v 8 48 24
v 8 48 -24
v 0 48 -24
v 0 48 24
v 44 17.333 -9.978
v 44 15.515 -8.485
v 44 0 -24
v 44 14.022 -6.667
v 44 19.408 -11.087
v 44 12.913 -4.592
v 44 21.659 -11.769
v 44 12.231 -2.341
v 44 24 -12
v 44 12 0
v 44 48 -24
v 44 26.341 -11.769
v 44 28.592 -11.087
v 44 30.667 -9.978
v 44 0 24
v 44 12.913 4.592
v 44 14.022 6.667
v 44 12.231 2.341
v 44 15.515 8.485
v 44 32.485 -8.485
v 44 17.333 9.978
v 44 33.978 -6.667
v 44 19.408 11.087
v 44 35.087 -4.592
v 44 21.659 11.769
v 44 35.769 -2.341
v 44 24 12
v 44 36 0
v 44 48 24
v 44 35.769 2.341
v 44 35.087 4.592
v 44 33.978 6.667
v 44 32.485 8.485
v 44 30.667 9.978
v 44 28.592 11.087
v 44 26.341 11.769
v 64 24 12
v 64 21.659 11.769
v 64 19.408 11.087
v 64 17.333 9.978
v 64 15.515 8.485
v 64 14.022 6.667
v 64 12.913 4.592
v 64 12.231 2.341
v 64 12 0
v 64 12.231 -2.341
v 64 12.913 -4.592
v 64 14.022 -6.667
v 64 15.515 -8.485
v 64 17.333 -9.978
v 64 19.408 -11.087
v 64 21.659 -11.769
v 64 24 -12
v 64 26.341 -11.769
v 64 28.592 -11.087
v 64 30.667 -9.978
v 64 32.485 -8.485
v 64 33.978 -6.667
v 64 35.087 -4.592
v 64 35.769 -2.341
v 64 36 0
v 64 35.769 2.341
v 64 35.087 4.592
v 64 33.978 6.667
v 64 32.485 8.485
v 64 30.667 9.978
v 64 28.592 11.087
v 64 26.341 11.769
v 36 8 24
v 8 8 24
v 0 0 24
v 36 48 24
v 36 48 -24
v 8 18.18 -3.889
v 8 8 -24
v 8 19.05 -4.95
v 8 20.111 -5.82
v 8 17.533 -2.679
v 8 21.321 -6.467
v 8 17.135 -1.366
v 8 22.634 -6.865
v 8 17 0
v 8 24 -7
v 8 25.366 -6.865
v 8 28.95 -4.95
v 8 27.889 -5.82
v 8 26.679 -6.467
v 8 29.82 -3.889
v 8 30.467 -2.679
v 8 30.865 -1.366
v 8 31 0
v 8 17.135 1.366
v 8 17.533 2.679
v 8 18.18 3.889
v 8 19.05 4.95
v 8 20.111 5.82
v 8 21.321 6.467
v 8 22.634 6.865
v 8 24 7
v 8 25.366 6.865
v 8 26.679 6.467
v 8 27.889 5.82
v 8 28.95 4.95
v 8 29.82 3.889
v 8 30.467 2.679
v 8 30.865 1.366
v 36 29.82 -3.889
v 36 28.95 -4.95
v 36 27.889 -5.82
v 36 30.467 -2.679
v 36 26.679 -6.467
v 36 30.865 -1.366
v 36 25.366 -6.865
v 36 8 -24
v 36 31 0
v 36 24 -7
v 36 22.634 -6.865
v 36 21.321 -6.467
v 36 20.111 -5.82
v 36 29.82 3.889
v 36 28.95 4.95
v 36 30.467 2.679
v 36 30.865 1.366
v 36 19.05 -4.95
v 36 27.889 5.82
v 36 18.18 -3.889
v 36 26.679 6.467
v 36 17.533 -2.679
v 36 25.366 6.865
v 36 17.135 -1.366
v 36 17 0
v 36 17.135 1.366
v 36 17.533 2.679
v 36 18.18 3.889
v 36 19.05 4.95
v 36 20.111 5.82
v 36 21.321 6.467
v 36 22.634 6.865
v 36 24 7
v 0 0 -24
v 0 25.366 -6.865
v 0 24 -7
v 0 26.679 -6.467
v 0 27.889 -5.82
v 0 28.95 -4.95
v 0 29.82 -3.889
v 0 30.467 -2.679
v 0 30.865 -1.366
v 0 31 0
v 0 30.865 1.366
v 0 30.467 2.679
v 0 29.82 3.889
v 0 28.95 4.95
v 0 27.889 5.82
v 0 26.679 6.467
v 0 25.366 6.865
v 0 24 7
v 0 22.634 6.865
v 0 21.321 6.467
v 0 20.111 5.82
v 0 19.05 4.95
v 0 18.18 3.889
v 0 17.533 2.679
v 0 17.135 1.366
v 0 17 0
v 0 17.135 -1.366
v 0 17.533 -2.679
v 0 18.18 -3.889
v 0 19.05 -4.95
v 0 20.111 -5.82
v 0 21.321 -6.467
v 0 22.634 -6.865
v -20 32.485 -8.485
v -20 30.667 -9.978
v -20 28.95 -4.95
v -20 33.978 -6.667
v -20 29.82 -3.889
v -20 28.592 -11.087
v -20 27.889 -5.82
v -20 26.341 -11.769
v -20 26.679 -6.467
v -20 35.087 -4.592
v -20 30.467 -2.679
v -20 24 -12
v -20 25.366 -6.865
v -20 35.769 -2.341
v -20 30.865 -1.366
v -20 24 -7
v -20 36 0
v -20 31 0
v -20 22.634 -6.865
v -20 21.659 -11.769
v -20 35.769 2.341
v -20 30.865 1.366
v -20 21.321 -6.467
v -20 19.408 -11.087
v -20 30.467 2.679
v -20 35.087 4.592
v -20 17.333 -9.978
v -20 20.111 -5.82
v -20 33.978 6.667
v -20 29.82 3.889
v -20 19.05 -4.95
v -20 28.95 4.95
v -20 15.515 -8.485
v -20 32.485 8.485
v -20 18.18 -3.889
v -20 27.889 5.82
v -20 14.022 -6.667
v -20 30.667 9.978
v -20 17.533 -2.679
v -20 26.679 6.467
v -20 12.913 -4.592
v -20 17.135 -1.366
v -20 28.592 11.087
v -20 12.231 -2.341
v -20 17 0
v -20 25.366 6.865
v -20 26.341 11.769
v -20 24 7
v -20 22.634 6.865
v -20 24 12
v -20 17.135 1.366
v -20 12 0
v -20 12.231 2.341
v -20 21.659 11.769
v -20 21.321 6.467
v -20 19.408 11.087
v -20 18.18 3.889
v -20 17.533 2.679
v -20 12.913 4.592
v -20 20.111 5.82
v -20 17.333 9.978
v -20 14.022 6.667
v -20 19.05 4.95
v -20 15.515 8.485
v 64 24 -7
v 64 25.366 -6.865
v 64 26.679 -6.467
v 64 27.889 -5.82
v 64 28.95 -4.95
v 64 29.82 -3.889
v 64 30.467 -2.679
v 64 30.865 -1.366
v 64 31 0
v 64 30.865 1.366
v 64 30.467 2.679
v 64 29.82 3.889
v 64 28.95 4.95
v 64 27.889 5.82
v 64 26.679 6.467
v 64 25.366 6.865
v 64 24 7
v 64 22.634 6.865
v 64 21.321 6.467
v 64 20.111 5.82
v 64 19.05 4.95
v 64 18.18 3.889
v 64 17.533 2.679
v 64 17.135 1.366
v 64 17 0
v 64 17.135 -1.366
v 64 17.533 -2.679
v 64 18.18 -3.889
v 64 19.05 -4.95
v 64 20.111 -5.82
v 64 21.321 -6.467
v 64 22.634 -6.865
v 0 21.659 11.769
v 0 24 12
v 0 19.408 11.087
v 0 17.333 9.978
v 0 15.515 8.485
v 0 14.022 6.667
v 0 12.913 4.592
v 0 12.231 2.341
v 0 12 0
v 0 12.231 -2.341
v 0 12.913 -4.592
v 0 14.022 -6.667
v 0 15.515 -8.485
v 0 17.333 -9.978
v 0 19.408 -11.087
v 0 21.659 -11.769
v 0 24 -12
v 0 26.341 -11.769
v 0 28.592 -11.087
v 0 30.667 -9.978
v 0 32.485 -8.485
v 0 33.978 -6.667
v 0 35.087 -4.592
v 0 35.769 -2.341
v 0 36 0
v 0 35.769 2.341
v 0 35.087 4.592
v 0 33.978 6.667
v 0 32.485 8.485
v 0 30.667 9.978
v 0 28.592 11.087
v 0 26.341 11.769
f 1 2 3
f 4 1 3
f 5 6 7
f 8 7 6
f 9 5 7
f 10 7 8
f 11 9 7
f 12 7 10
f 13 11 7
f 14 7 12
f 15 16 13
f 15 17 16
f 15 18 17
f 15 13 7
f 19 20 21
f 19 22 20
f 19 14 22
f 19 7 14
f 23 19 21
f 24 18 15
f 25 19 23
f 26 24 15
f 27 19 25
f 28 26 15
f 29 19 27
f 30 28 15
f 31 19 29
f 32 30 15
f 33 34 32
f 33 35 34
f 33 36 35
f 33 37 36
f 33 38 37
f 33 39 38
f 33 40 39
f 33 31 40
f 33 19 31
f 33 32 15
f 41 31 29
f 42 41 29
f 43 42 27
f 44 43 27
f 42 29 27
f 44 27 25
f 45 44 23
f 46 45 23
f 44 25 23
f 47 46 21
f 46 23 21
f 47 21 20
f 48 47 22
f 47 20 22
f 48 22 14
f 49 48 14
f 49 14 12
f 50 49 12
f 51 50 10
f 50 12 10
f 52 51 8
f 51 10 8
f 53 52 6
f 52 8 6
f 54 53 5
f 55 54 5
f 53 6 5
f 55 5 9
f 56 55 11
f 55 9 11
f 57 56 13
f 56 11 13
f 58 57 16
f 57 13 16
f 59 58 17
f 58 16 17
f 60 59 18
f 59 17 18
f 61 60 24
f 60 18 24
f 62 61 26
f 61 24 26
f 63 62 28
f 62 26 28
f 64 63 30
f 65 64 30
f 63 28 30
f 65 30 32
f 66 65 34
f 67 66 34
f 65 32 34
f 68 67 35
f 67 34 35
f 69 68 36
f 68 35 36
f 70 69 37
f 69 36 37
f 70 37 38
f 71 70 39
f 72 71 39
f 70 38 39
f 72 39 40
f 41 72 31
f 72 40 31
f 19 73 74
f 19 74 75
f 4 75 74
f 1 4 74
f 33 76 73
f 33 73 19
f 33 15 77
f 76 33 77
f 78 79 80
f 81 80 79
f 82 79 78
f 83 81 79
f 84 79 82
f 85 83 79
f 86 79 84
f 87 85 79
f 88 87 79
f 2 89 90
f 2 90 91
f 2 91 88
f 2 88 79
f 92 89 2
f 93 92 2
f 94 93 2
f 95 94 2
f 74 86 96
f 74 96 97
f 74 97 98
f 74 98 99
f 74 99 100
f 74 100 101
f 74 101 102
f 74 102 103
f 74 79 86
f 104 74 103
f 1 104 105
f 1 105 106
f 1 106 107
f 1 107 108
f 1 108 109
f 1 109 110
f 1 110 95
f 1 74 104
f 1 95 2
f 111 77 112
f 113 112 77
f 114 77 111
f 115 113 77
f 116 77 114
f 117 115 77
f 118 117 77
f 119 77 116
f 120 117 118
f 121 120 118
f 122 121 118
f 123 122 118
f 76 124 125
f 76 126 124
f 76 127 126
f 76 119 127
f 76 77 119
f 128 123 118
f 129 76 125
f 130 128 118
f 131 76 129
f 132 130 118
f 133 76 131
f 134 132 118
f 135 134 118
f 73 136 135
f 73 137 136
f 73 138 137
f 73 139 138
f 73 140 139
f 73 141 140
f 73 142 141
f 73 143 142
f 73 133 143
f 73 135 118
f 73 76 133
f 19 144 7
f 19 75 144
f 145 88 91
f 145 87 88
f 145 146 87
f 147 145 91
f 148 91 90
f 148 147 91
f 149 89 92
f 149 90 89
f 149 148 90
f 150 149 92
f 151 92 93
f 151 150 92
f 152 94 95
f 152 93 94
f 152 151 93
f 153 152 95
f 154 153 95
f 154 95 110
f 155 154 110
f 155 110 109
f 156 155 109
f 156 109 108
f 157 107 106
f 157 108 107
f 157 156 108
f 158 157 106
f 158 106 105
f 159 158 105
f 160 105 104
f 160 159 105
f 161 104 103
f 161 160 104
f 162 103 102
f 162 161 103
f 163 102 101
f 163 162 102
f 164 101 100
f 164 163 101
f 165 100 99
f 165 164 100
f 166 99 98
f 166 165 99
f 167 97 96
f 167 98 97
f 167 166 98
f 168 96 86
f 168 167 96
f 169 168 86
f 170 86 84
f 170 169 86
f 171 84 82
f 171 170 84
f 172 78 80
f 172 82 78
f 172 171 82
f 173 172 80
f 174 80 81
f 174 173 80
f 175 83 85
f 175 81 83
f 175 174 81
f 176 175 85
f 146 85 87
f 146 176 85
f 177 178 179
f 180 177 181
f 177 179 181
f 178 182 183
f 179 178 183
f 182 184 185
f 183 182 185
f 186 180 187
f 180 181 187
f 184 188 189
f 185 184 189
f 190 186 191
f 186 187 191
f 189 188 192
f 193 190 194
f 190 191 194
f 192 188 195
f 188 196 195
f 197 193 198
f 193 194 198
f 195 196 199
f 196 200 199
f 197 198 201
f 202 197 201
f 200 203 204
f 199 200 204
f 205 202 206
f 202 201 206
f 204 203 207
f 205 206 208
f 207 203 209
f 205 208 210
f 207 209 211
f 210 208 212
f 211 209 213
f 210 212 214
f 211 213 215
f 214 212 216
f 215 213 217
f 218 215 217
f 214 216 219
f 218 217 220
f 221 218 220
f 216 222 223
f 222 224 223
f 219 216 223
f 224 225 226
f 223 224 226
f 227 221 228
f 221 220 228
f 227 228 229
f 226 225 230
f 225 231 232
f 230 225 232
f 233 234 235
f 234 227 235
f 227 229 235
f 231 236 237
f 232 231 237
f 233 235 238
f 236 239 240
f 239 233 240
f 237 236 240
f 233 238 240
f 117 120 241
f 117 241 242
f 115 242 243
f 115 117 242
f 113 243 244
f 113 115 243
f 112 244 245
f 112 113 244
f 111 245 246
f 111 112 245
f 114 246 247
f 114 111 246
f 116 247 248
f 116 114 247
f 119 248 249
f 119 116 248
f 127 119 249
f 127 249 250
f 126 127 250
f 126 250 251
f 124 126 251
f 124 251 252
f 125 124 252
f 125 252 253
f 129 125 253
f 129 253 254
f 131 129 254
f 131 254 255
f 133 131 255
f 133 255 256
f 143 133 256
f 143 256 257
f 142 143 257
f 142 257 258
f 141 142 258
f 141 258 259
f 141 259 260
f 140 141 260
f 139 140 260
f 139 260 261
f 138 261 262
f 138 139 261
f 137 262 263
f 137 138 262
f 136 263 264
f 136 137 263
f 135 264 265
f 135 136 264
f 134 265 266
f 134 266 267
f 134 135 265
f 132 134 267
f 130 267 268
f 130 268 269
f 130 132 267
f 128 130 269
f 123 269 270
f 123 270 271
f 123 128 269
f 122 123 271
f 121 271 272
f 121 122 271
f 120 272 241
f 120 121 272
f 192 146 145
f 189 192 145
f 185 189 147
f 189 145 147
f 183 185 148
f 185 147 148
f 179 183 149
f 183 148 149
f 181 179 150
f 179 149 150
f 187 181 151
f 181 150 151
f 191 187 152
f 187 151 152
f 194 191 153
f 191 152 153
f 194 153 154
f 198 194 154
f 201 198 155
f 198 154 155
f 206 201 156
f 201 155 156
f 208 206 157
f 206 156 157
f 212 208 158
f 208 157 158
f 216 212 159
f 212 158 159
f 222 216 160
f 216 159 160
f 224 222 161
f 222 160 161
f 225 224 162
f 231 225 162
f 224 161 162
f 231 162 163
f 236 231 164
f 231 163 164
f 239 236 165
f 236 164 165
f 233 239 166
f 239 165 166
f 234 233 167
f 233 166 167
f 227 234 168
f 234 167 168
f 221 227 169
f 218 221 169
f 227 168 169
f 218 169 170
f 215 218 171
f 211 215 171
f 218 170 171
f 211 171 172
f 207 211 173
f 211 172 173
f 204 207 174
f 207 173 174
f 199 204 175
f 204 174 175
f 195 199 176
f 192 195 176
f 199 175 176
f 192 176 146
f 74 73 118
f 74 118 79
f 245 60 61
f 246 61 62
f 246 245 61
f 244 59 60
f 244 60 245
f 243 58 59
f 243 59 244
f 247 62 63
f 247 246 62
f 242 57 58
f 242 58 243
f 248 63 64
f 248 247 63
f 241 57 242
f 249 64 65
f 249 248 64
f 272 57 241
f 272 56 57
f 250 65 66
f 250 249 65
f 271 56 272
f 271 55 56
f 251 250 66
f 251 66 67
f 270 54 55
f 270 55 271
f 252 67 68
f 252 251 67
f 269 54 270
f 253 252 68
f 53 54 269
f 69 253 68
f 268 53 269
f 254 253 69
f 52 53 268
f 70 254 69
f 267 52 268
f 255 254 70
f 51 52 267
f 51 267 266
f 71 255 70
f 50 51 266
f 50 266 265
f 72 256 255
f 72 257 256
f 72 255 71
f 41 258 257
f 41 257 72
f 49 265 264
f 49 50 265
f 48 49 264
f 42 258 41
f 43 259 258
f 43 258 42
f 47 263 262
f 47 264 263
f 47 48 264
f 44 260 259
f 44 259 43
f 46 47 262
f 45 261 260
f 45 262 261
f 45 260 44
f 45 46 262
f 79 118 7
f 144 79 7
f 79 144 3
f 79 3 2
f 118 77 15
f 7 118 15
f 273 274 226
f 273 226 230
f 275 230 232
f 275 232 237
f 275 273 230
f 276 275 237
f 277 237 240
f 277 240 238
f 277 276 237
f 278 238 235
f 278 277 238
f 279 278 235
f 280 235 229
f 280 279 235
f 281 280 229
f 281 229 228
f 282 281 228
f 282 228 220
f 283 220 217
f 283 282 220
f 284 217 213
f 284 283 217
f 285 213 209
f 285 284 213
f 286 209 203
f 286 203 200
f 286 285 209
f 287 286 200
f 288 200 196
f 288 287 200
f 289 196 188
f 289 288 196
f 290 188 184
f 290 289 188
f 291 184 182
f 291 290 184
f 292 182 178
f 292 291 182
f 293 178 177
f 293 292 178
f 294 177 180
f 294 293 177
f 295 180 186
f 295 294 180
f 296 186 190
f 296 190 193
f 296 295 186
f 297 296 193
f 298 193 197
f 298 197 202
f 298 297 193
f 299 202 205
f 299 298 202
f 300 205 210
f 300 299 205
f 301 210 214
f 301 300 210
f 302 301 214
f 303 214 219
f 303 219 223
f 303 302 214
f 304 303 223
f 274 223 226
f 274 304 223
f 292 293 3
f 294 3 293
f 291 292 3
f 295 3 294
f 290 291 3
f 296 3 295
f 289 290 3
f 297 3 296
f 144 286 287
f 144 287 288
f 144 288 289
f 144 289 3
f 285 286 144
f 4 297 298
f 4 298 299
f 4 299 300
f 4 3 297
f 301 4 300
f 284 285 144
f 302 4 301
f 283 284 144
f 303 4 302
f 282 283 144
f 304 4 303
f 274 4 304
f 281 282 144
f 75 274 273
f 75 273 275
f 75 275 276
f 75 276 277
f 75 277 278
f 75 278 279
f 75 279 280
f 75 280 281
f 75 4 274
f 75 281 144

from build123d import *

# Parameters (mm, degrees)
BOSS_EXTRUDE1_DEPTH     = 24
SKETCH2_R               = 12
SKETCH2_R_2             = 7
BOSS_EXTRUDE2_DEPTH     = 20
CUT_EXTRUDE1_DEPTH      = 70.397406292
CUT_EXTRUDE1_DEPTH_BACK = 70.397406292
SKETCH3_R               = 7


with BuildPart() as part:
    # Sketch1 → Boss-Extrude1 (new, symmetric)
    with BuildSketch(Plane.XY):
        Polygon((0, 0), (44, 0), (44, 47.073103448), (44, 48), (36, 48), (36, 8), (8, 8), (8, 48), (0, 48), align=None)
    extrude(amount=BOSS_EXTRUDE1_DEPTH, both=True)

    # Sketch2 → Boss-Extrude2 (add)
    with BuildSketch(Plane(origin=(44, 0, 0), x_dir=(0, 0, -1), z_dir=(1, 0, 0))):
        with Locations(Location((0, 24, 0), (0, 0, 180))):
            Circle(SKETCH2_R)
        with Locations((0, 24)):
            Circle(SKETCH2_R_2, mode=Mode.SUBTRACT)
    boss_extrude2 = extrude(amount=BOSS_EXTRUDE2_DEPTH)

    # Sketch3 → Cut-Extrude1 (cut, two sides: drawn at the far end of the back side and taken through both)
    with BuildSketch(Plane(origin=(44, 0, 0), x_dir=(0, 0, -1), z_dir=(1, 0, 0)).offset(-CUT_EXTRUDE1_DEPTH_BACK)):
        with Locations((0, 24)):
            Circle(SKETCH3_R)
    extrude(amount=CUT_EXTRUDE1_DEPTH + CUT_EXTRUDE1_DEPTH_BACK, mode=Mode.SUBTRACT)

    # Mirror1: Boss-Extrude2 across plane
    add(boss_extrude2.mirror(Plane.ZY.offset(-22)))


solid = part.part
